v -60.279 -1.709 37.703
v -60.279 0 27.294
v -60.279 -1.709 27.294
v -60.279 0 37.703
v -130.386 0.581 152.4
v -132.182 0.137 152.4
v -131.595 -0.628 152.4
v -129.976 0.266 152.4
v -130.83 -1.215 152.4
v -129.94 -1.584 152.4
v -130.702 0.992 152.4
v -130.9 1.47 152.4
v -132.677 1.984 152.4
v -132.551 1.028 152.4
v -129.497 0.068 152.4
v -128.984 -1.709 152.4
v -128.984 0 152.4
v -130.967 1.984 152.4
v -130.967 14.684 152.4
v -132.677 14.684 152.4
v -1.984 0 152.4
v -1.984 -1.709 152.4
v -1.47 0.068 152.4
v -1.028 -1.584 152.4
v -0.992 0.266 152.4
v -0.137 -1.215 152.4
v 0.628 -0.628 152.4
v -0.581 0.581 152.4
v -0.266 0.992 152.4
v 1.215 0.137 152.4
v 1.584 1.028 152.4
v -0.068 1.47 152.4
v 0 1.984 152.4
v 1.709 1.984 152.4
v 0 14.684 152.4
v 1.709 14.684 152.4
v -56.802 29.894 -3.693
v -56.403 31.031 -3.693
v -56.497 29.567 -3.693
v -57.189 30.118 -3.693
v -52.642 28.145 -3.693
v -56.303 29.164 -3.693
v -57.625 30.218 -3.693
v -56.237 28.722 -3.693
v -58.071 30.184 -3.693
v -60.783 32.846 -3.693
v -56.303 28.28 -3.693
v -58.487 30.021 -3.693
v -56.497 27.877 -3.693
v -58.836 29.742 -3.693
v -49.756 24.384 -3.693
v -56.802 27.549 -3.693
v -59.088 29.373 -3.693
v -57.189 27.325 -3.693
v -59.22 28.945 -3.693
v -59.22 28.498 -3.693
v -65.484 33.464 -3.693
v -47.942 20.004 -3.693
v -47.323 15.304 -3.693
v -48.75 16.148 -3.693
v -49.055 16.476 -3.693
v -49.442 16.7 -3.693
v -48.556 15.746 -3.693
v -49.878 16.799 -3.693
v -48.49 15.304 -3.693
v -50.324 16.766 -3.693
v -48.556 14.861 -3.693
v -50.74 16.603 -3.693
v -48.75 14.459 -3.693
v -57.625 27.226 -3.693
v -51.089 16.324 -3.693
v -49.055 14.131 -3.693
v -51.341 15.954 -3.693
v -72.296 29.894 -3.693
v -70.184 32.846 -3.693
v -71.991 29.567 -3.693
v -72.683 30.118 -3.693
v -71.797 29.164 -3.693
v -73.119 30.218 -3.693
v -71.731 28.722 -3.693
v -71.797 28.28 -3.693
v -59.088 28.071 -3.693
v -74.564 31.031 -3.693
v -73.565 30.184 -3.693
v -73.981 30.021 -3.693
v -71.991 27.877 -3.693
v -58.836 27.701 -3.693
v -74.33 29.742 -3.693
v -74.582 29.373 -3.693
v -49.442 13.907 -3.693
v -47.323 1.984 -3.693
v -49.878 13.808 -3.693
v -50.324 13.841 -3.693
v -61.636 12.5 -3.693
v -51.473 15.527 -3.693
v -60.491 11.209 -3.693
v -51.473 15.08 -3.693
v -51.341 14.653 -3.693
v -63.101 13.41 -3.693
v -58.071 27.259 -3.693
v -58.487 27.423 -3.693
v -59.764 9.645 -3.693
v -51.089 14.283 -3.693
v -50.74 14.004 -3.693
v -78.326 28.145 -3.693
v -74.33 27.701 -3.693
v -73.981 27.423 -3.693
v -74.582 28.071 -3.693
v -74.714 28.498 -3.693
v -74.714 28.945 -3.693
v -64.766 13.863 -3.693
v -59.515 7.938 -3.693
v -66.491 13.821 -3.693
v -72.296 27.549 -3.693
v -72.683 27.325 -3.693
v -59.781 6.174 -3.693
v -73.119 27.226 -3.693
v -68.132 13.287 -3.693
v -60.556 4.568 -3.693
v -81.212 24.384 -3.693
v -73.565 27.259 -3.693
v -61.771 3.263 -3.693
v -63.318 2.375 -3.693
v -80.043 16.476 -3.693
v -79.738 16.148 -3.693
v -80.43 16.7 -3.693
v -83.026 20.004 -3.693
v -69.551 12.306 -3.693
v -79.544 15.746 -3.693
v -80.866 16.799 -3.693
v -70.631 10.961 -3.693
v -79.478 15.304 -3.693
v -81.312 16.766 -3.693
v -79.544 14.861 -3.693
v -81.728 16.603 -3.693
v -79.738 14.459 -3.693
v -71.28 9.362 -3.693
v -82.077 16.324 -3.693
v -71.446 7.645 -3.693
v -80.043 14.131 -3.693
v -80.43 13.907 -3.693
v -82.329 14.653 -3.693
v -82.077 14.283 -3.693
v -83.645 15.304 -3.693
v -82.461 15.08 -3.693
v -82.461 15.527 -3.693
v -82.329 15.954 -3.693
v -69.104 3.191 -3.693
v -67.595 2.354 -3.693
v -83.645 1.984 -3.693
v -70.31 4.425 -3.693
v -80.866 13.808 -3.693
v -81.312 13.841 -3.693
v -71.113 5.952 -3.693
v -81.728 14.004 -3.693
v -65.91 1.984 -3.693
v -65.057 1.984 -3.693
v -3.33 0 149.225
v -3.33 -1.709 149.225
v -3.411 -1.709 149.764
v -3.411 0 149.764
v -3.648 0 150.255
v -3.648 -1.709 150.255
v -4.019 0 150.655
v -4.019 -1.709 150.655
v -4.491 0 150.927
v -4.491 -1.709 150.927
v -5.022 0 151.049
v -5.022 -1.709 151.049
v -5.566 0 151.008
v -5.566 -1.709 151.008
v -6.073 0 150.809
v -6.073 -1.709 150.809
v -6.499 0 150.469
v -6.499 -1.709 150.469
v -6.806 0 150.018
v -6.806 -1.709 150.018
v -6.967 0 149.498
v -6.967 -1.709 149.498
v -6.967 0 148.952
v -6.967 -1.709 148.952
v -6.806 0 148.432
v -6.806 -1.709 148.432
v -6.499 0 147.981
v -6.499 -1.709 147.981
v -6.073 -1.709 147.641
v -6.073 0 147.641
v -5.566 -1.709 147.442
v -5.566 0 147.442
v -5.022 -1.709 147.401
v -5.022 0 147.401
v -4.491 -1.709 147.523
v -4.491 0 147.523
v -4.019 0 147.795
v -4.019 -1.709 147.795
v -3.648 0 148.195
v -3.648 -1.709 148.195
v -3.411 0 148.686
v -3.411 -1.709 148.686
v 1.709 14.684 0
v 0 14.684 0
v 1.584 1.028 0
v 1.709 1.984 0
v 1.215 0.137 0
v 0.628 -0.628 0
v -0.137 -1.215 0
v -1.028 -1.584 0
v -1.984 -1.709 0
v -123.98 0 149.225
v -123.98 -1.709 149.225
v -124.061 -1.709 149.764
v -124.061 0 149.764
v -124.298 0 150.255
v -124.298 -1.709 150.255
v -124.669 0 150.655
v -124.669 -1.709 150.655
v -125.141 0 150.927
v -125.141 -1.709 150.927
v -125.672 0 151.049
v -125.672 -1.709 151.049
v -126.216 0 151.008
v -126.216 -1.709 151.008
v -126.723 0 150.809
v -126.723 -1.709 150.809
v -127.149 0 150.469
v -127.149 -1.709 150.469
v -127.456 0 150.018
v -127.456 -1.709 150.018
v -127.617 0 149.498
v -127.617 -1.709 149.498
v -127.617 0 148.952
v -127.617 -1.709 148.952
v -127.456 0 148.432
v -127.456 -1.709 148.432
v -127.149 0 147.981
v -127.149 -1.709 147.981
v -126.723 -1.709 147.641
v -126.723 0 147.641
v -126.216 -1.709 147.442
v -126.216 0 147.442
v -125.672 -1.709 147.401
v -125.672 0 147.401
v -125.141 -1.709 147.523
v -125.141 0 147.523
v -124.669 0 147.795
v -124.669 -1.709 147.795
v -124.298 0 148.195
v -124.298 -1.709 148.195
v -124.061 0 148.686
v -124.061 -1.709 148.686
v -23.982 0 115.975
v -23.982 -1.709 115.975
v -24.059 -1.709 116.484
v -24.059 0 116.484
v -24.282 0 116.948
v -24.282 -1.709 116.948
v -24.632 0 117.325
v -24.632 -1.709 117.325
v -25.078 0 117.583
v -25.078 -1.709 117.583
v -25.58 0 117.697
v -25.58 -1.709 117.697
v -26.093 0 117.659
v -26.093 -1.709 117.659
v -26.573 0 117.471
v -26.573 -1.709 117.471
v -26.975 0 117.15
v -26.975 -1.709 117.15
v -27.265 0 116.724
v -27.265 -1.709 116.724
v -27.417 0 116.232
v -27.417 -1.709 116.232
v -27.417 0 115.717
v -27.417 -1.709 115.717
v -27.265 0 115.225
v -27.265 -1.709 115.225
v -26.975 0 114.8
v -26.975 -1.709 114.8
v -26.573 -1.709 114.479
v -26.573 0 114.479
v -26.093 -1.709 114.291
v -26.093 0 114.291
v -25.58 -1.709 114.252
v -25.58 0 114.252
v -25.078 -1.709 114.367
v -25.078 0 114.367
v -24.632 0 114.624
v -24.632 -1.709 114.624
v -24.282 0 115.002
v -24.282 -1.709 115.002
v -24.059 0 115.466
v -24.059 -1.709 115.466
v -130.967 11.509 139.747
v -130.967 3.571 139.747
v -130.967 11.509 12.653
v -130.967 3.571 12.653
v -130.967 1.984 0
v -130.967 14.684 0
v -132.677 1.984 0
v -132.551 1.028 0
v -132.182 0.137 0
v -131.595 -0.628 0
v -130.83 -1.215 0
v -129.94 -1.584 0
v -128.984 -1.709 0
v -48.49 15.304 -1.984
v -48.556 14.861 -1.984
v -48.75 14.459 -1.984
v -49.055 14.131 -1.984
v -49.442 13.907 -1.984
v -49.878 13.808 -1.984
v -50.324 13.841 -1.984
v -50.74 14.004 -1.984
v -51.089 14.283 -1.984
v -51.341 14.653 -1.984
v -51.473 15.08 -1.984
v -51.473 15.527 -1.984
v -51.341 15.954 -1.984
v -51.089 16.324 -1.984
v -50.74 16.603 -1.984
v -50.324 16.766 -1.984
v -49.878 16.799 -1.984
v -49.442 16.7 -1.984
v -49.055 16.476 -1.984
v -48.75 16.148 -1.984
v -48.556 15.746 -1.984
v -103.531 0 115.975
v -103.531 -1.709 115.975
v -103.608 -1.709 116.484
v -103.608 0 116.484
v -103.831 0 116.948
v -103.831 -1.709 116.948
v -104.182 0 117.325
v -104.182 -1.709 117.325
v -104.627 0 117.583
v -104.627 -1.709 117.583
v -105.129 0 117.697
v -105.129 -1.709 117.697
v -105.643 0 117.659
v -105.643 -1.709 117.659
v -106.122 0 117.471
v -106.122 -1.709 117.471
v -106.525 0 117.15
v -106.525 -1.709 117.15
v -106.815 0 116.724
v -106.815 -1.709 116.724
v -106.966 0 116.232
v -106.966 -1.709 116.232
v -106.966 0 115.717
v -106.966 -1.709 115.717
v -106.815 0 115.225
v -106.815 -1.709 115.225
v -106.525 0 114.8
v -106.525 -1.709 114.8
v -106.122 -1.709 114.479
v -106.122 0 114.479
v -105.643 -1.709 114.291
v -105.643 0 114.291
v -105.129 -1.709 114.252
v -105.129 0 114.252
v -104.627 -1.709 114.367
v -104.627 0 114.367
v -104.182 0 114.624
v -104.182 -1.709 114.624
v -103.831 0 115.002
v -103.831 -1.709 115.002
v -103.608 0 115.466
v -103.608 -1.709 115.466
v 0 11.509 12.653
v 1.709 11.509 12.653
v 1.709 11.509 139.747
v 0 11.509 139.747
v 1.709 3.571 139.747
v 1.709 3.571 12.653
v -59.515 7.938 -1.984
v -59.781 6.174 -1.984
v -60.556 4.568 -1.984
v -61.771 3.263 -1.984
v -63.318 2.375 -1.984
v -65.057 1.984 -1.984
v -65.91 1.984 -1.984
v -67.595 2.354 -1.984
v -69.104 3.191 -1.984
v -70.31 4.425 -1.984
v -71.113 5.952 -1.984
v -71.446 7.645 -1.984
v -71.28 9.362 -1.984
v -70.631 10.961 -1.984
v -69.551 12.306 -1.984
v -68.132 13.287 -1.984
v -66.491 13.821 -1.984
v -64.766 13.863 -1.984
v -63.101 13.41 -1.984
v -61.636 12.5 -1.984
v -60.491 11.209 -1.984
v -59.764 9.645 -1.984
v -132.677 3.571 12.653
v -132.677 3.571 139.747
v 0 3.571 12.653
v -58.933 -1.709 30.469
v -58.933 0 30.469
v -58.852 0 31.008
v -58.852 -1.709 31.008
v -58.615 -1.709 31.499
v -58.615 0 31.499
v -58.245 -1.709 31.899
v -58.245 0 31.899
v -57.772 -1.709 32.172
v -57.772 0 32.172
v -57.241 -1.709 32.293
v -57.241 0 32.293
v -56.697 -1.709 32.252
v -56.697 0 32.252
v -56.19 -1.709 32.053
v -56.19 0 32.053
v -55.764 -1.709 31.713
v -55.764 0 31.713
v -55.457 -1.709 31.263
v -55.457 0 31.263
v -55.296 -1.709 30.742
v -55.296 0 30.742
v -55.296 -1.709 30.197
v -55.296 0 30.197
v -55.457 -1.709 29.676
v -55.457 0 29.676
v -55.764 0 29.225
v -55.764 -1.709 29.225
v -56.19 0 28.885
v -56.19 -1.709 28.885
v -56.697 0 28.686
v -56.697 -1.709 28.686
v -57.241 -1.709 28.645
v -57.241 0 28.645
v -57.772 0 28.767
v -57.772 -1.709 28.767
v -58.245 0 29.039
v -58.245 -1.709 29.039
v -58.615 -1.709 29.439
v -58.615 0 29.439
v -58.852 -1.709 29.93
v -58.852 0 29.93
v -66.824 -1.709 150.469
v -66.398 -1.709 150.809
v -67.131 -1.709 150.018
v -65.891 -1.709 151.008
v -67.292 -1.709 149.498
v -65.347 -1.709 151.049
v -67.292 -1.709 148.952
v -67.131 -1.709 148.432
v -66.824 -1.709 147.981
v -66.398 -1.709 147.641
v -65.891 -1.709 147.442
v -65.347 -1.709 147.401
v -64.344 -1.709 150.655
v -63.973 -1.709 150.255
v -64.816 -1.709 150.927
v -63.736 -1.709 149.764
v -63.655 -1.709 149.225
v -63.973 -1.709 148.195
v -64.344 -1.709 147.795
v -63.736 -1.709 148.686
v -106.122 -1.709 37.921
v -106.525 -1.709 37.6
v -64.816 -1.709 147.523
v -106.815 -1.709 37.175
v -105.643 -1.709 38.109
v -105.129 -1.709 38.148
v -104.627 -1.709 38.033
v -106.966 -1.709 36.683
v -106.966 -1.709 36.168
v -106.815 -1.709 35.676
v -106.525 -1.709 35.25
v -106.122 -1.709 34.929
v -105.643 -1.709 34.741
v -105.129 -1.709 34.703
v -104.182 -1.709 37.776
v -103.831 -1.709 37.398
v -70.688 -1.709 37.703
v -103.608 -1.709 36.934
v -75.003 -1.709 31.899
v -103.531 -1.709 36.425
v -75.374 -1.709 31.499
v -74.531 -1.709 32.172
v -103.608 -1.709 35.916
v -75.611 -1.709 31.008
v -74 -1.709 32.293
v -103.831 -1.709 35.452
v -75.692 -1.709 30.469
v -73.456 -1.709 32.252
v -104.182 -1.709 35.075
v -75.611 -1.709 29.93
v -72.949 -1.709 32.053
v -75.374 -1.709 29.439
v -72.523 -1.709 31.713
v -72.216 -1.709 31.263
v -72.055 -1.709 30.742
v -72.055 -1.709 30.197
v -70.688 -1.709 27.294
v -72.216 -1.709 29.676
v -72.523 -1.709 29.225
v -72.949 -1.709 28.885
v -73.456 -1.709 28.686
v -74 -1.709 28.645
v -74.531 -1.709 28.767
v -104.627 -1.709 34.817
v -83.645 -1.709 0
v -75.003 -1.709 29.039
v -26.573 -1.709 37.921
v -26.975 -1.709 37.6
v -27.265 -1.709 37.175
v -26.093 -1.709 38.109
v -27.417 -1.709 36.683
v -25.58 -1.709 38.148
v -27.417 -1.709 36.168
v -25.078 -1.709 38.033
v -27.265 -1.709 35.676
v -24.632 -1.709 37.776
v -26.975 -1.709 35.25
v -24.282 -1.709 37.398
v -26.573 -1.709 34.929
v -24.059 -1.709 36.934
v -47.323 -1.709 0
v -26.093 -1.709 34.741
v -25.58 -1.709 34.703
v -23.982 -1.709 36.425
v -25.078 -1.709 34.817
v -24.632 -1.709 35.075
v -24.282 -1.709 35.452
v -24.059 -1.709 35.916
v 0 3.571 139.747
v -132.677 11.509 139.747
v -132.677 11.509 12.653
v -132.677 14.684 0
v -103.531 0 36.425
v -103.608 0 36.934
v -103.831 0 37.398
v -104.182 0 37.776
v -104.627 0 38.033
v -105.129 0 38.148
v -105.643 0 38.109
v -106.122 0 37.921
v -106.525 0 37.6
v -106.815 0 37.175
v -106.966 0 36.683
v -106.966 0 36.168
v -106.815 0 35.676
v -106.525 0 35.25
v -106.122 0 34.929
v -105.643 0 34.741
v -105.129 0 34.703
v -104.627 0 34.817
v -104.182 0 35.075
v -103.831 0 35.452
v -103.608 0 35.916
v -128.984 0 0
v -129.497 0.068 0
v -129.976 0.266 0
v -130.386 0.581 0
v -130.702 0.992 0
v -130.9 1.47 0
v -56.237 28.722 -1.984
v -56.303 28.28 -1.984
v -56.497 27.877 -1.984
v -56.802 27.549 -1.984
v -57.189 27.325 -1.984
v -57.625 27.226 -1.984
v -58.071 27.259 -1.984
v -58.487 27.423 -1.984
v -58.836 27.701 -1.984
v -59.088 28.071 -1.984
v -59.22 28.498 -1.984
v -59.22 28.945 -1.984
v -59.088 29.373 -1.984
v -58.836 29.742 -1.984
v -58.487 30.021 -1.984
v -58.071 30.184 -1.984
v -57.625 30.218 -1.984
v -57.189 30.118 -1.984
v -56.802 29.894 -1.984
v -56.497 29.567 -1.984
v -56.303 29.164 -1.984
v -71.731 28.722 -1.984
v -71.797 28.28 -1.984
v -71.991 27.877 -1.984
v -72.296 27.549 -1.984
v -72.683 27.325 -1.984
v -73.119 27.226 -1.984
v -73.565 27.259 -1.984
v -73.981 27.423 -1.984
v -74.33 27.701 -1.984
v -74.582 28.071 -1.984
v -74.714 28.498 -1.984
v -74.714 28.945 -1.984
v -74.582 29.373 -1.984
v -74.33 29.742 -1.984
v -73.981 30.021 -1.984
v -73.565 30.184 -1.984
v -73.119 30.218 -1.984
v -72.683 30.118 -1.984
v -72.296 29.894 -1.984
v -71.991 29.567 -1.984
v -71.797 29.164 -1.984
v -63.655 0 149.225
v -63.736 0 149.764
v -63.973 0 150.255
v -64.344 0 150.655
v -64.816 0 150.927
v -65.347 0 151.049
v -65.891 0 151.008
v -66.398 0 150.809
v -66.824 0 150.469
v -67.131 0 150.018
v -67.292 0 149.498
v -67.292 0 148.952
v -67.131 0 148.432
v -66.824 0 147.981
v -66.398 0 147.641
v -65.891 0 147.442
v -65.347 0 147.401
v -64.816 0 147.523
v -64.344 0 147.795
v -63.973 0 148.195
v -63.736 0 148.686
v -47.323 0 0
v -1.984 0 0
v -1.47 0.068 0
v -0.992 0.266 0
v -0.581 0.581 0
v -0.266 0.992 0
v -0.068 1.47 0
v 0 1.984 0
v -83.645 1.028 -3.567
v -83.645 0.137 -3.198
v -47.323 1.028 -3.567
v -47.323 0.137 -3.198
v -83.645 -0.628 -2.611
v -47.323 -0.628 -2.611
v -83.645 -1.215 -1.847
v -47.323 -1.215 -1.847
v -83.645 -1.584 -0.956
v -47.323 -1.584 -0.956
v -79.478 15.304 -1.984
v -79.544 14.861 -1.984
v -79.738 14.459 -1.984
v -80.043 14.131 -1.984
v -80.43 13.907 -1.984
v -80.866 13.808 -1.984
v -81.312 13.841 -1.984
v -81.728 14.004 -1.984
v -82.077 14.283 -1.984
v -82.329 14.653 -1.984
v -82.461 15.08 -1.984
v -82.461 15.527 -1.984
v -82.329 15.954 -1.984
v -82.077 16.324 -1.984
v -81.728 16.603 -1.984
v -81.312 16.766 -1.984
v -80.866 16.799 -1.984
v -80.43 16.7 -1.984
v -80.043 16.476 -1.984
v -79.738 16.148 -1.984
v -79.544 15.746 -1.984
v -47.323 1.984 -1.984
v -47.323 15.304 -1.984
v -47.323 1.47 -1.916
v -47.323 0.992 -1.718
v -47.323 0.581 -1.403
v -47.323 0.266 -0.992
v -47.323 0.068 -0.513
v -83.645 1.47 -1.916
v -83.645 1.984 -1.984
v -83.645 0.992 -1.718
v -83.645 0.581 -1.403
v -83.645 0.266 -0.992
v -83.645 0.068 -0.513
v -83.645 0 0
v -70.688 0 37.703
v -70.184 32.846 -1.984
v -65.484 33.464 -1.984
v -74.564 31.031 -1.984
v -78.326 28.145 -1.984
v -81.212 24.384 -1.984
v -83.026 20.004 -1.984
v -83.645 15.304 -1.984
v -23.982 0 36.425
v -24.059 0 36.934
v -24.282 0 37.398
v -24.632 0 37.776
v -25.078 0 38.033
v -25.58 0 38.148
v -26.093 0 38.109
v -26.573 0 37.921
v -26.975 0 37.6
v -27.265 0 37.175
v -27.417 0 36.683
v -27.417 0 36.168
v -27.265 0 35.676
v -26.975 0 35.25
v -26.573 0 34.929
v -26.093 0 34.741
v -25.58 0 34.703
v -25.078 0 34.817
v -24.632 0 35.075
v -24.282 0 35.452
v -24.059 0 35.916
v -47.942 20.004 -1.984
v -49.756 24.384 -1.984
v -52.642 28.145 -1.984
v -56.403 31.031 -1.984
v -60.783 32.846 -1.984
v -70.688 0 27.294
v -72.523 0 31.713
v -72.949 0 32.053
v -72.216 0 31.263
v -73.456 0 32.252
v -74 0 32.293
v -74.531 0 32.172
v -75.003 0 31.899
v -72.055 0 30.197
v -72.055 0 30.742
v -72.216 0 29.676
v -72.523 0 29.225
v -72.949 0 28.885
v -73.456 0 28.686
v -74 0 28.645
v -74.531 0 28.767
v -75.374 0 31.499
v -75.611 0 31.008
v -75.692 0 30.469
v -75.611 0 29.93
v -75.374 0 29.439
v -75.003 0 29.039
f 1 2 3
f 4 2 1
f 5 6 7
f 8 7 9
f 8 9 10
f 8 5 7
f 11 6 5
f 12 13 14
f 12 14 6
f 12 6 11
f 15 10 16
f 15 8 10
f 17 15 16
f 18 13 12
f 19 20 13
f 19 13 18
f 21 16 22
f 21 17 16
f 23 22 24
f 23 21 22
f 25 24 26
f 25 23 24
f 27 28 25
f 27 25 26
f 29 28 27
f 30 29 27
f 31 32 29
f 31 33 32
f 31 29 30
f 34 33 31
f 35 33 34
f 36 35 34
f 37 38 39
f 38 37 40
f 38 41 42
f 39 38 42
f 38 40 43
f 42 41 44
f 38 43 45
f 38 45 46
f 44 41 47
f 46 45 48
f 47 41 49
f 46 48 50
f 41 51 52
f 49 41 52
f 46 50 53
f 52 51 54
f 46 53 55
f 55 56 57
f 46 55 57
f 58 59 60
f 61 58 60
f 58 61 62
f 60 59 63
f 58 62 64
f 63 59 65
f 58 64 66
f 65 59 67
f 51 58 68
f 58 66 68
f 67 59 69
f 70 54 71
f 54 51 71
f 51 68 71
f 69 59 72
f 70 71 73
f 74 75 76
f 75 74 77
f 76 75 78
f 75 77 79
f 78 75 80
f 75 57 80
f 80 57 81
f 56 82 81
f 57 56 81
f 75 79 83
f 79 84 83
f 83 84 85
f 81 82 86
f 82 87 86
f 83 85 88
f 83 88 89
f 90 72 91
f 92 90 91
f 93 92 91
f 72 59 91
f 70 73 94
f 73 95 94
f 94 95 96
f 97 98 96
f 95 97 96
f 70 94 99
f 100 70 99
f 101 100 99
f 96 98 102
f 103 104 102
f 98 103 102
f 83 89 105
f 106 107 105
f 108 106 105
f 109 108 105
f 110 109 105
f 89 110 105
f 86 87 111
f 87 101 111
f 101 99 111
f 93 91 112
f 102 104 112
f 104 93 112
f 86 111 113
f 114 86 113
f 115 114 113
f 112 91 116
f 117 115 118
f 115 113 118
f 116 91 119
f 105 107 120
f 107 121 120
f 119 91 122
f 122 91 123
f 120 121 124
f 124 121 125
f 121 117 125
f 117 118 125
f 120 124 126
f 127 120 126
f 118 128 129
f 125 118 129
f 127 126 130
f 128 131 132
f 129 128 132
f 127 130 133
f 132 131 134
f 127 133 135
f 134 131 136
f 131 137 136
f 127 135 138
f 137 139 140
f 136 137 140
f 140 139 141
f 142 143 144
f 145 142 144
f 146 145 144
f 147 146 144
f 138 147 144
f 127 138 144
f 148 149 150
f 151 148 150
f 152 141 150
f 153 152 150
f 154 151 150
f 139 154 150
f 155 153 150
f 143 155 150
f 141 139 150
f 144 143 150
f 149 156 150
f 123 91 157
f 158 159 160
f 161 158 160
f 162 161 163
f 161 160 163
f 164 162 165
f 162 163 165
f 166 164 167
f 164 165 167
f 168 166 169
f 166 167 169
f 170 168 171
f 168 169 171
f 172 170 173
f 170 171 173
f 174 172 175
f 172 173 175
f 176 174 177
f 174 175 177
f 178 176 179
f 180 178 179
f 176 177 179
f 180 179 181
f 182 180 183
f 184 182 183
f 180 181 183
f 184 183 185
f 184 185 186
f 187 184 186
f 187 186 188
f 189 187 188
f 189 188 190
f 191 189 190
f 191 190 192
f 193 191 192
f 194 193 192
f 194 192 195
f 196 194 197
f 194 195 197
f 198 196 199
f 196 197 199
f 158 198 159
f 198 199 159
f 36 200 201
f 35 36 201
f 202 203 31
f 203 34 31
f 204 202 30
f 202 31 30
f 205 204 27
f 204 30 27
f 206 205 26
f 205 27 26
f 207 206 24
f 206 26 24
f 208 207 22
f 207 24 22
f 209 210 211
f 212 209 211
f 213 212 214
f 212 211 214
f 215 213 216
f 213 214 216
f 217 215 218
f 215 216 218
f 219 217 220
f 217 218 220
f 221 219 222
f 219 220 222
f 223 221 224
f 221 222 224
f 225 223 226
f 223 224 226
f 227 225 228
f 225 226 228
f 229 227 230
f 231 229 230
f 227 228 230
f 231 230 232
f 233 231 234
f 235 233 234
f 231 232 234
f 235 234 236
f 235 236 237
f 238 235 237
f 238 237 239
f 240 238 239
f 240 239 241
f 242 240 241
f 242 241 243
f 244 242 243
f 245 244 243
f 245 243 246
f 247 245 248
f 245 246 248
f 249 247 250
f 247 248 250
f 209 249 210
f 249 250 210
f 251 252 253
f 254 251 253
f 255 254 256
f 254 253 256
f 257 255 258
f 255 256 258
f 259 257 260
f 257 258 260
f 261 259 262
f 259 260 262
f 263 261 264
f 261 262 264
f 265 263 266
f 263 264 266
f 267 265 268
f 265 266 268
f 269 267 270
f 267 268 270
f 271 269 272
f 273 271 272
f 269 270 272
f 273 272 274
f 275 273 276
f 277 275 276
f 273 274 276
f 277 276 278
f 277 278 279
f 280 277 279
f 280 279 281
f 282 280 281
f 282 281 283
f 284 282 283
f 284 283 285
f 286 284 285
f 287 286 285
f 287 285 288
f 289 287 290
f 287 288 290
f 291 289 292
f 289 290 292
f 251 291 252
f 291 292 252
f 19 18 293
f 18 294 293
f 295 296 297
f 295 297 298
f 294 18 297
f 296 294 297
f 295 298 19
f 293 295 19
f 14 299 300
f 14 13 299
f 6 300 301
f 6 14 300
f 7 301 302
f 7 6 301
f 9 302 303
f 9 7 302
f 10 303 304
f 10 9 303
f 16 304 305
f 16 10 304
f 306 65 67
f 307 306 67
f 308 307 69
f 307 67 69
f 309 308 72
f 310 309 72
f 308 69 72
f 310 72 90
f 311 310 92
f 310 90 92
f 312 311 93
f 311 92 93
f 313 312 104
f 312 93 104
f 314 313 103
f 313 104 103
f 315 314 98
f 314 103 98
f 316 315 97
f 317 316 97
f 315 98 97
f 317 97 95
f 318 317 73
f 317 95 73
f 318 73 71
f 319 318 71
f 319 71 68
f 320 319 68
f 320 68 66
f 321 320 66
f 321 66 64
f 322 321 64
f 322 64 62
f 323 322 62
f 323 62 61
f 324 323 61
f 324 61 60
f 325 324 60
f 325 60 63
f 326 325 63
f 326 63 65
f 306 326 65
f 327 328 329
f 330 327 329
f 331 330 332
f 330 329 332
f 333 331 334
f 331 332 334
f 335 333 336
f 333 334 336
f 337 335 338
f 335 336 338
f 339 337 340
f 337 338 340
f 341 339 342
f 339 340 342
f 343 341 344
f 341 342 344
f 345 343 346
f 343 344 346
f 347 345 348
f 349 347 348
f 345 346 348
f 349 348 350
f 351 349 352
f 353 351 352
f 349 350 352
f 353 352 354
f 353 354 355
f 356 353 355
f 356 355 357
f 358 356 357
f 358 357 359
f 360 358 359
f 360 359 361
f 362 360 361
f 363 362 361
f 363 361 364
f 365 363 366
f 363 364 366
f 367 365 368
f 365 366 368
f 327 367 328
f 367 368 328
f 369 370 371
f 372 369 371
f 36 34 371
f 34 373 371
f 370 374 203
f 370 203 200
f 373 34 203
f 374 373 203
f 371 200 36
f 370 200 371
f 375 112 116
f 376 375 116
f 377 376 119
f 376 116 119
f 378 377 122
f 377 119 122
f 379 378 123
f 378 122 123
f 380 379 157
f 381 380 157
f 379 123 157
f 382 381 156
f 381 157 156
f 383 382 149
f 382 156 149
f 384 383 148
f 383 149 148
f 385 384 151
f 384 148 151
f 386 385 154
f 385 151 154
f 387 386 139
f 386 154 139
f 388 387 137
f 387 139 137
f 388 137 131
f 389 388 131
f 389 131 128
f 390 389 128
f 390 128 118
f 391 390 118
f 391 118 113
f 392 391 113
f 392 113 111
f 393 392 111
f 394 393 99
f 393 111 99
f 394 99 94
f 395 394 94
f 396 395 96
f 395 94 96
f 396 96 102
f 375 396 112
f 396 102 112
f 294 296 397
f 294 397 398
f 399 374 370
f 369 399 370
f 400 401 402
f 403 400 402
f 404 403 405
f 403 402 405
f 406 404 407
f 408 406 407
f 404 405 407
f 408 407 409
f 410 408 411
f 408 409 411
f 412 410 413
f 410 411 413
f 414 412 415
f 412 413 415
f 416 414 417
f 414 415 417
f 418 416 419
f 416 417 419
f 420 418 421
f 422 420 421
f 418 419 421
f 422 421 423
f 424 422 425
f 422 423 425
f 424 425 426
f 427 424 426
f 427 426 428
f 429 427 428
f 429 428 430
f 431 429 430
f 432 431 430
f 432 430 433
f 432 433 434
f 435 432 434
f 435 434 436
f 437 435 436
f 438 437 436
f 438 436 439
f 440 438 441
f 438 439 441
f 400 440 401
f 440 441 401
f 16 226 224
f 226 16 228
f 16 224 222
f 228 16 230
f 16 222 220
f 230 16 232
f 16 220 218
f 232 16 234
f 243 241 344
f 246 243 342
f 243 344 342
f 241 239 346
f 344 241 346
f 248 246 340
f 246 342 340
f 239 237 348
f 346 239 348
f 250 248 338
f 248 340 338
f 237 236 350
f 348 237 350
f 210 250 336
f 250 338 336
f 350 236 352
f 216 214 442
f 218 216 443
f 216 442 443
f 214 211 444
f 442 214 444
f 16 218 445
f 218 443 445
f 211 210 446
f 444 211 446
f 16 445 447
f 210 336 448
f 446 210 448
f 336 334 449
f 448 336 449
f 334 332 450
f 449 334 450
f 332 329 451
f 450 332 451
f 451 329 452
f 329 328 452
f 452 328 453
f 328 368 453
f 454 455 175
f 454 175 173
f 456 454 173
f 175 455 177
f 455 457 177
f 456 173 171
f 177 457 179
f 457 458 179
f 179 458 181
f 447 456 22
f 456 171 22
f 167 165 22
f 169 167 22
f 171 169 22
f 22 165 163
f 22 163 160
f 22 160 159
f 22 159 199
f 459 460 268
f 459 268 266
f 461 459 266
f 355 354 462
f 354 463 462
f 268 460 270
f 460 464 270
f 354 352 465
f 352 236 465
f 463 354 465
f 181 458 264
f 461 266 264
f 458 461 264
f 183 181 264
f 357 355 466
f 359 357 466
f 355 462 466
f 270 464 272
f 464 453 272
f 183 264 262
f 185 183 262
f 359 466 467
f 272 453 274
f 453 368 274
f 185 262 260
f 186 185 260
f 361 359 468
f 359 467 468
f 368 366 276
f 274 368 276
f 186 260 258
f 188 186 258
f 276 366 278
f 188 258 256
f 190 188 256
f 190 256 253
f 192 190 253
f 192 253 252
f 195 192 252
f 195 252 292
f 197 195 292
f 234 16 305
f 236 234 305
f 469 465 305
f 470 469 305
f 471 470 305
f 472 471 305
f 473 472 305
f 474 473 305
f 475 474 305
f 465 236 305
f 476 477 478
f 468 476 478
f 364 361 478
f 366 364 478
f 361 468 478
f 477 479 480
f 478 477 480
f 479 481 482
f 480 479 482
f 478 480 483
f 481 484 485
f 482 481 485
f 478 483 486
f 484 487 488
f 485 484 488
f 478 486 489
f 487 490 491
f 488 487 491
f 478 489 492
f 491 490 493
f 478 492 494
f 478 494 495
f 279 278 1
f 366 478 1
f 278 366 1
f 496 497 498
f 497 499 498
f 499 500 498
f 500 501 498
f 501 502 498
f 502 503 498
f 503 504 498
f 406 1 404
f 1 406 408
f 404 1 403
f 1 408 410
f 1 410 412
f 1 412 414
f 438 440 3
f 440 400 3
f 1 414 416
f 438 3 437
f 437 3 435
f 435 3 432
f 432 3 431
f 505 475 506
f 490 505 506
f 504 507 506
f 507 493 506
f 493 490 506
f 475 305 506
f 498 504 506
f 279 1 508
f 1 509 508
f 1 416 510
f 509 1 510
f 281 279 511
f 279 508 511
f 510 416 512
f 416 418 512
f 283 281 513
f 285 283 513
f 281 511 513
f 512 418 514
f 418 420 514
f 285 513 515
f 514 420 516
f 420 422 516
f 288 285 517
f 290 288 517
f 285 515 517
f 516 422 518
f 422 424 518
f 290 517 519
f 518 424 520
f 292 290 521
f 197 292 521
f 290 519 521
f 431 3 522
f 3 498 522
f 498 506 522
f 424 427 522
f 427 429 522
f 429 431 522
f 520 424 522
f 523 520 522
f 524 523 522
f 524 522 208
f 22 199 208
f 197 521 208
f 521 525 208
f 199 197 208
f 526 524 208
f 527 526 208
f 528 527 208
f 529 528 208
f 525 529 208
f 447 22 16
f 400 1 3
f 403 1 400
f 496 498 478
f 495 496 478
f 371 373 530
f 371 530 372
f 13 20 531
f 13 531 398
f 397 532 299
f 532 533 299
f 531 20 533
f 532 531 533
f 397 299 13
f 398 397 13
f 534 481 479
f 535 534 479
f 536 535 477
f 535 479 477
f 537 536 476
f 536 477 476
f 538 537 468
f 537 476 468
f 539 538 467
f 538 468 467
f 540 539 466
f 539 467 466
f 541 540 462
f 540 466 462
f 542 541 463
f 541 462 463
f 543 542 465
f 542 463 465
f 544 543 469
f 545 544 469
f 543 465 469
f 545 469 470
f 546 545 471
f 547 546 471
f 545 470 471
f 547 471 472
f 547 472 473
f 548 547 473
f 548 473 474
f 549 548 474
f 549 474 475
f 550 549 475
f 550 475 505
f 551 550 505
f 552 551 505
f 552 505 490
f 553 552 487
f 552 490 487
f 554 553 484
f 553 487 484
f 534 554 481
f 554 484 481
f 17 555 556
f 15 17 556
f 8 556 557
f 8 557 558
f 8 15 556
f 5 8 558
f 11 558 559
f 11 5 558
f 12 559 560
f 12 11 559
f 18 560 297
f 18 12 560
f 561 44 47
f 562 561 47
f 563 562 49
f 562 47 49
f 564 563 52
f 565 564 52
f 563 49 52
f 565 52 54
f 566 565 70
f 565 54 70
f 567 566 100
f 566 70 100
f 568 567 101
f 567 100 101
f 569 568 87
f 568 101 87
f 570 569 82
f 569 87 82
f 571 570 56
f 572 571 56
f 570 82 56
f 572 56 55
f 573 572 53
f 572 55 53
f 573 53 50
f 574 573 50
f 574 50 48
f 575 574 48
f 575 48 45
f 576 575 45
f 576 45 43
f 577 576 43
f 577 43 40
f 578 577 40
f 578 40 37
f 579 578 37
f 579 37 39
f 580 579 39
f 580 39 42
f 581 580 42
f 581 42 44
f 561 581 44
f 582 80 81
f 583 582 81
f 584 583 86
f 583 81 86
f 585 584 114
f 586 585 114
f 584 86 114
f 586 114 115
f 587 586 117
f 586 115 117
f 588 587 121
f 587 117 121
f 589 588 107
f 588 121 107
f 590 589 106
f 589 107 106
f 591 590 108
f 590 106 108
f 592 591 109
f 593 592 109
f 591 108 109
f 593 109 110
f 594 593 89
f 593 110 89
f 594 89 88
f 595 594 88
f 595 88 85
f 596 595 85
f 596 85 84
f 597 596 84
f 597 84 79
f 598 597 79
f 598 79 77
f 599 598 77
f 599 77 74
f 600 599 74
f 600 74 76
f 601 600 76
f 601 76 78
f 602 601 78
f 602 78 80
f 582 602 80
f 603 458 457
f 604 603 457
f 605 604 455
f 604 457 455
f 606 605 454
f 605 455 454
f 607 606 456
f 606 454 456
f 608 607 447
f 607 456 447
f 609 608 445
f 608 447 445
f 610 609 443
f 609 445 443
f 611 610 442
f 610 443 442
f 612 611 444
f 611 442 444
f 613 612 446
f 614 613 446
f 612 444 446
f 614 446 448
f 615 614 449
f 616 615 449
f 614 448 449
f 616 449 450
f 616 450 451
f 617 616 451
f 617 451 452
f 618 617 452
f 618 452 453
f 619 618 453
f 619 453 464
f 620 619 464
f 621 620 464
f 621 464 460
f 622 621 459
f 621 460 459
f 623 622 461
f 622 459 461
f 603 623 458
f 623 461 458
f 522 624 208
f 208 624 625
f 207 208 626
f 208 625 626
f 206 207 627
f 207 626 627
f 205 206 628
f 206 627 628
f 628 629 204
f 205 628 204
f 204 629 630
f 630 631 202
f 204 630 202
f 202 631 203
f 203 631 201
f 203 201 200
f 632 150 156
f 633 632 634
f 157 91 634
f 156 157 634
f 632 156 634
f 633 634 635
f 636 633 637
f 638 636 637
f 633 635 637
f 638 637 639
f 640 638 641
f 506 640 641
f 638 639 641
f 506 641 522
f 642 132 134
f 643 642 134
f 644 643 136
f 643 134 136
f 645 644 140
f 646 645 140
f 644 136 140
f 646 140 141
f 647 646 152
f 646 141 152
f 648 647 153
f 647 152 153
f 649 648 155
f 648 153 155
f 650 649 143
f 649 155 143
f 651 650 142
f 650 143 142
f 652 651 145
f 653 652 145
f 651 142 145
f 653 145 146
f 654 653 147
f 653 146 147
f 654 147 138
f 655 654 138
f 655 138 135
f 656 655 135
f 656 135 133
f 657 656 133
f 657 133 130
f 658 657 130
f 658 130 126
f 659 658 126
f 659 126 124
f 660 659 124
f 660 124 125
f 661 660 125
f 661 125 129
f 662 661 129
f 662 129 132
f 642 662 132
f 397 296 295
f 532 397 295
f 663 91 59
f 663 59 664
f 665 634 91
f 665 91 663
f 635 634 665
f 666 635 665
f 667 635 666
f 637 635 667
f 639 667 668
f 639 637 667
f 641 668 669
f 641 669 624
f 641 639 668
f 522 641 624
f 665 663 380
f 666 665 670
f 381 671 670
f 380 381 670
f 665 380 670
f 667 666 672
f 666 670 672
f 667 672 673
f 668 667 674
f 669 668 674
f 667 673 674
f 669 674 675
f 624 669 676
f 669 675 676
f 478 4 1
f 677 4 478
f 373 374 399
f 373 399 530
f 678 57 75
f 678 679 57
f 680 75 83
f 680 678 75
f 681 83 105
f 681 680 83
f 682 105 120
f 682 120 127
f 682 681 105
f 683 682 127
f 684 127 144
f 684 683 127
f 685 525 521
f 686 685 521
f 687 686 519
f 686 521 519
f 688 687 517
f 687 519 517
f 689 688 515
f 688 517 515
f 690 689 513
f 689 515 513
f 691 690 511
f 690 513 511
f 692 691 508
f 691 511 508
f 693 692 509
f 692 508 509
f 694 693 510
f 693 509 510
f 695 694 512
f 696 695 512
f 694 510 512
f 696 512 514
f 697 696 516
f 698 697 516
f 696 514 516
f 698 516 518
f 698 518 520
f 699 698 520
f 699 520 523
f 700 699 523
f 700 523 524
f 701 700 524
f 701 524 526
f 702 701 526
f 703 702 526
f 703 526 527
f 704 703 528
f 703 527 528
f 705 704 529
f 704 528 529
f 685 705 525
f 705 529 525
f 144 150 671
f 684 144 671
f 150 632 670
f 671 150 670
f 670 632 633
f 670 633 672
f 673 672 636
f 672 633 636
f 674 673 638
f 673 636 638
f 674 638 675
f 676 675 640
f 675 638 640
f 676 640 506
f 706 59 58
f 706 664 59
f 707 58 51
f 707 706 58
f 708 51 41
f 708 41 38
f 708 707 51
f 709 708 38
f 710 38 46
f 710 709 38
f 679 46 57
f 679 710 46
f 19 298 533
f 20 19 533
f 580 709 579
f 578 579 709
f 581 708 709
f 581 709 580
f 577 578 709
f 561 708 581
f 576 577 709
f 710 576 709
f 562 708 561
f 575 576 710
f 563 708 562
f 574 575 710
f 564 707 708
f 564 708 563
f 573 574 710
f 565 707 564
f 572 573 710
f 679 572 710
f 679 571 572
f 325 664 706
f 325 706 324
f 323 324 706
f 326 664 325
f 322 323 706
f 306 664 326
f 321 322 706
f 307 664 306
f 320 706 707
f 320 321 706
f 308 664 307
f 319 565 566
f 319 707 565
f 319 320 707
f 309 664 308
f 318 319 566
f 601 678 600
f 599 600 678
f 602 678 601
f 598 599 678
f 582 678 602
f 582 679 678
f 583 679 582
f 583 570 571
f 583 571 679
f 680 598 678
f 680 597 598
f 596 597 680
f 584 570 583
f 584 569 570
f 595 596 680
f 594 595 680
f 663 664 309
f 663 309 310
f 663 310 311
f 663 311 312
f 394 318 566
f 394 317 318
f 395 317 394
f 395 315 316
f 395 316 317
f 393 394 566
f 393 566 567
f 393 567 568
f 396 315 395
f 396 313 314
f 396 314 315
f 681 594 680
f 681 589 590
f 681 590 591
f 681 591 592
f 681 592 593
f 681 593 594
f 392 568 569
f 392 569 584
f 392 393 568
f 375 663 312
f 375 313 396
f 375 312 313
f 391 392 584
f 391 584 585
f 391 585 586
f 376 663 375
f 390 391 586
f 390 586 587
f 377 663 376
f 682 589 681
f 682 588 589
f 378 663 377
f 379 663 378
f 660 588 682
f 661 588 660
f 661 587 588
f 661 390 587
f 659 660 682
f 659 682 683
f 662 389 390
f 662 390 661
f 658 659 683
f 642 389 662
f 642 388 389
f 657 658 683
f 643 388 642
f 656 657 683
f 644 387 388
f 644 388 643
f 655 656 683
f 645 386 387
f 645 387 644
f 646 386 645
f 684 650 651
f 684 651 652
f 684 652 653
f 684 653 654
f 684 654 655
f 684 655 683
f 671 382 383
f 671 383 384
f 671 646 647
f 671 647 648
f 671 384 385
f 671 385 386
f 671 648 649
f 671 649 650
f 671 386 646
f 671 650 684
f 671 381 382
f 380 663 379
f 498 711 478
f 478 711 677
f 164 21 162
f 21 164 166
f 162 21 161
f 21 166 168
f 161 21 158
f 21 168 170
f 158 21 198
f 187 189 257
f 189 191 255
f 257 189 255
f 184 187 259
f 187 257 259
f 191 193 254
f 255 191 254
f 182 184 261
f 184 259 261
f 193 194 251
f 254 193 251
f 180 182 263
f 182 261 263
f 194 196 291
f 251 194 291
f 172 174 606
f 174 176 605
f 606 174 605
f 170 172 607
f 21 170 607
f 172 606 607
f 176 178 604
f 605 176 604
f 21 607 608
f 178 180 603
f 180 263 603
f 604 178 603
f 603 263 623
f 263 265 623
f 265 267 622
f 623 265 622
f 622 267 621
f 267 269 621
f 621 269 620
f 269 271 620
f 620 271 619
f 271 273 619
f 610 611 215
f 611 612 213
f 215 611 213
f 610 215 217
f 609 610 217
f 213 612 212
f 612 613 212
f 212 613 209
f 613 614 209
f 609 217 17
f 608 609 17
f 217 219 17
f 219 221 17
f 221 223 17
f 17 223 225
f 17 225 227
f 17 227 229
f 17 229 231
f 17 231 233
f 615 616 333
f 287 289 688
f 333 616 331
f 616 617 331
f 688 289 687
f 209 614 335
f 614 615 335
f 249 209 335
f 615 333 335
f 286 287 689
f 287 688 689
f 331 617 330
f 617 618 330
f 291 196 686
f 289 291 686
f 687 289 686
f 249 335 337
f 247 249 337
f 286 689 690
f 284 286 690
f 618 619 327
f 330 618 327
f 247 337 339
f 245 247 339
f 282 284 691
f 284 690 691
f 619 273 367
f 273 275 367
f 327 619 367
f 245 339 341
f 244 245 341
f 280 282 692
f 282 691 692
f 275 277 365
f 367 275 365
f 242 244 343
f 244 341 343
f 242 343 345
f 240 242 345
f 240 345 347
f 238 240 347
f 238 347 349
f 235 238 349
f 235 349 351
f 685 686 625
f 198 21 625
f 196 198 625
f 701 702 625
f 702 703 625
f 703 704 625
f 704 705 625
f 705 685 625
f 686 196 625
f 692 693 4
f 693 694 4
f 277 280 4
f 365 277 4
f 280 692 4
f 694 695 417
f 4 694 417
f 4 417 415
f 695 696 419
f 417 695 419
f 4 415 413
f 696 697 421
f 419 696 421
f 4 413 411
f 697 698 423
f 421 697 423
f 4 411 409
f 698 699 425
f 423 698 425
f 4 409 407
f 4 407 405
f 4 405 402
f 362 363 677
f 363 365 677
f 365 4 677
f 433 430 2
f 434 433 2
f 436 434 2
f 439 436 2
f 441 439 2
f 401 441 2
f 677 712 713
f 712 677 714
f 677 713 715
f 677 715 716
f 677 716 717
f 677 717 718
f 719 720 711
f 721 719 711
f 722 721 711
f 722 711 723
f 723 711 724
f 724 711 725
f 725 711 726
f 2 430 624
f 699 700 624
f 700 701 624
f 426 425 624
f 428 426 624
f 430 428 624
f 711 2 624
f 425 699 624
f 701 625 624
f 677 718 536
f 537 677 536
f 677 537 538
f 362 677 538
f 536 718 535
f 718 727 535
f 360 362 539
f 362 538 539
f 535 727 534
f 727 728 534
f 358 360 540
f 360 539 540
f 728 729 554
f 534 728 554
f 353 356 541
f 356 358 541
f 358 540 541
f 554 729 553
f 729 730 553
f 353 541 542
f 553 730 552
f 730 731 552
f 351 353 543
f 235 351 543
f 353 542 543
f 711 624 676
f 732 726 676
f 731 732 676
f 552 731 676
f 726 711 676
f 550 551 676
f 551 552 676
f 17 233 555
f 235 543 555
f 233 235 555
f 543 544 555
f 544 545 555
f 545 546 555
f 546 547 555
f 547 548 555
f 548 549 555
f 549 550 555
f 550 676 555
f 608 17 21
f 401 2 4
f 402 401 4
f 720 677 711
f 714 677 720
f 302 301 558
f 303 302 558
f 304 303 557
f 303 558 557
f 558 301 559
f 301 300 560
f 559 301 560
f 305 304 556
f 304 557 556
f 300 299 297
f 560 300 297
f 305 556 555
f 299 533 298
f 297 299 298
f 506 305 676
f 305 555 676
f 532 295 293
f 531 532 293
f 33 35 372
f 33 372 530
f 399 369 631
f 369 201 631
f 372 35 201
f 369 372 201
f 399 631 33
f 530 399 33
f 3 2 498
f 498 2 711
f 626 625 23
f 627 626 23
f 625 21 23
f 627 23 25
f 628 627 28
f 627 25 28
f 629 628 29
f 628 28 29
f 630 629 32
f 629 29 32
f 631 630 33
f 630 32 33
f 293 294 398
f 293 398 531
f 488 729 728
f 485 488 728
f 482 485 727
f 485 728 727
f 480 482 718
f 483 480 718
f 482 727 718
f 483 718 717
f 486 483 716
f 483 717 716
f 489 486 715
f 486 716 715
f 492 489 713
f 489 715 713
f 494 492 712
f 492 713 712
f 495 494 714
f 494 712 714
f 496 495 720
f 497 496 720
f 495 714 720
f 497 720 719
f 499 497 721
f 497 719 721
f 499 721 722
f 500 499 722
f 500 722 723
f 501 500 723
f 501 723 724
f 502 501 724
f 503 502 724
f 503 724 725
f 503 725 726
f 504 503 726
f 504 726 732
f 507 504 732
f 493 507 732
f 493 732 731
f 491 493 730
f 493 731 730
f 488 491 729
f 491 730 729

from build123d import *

# Parameters (mm, degrees)
F1_DEPTH  = 152.4
F2_W      = 7.9375
F2_H      = 127.0931567346
F3_DEPTH  = 134.38632
F4_W      = 36.322
F4_H      = 1.70942
F5_DEPTH  = 3.69316
F6_W      = 36.322
F6_H      = 1.70942
F7_DEPTH  = 33.4645
F8_R      = 3.69316
F9_R      = 1.98374
F10_R     = 5.969
F10_R_2   = 1.5
F11_DEPTH = 3.69316
F12_R     = 18.16099
F13_R     = 1.8288
F14_DEPTH = 1.70942
F15_R     = 1.7272
F16_DEPTH = 1.70942
F17_W     = 10.40892
F17_H     = 10.40892
F17_R     = 1.8288
F18_DEPTH = 1.70942


# Not quite as in the source:
# - a fillet or chamfer is up to 0.001 mm smaller than in the source, because OpenCascade refuses the exact size


with BuildPart() as f1:
    # F0 (on Top) → F1 (new body)
    with BuildSketch(Plane.XY):
        Polygon((0, 14.68374), (0, 0), (-130.96748, 0), (-130.96748, 14.68374), (-132.6769, 14.68374), (-132.6769, -1.70942), (1.70942, -1.70942), (1.70942, 14.68374), align=None)
    extrude(amount=F1_DEPTH)

    # F2 (on face) → F3 (cut, through all)
    with BuildSketch(Plane.YZ.offset(1.70942)):
        with Locations((7.53999, 76.2)):
            Rectangle(F2_W, F2_H)
    extrude(amount=-F3_DEPTH, mode=Mode.SUBTRACT)

    # F4 (on face) → F5 (join)
    with BuildSketch(Plane(origin=(0, 0, 0), x_dir=(1, 0, 0), z_dir=(0, 0, -1))):
        with Locations((-65.48374, 0.85471)):
            Rectangle(F4_W, F4_H)
    extrude(amount=F5_DEPTH)

    # F6 (on face) → F7 (join)
    with BuildSketch(Plane(origin=(0, 0, 0), x_dir=(-1, 0, 0), z_dir=(0, 1, 0))):
        with Locations((65.48374, -2.83845)):
            Rectangle(F6_W, F6_H)
    extrude(amount=F7_DEPTH)

    # F8
    f8_edges = [f1.edges().sort_by_distance(p)[0] for p in [
        (1.70942, -1.70942, 76.2),
        (-132.6769, -1.70942, 76.2),
        (-65.48374, -1.70942, -3.69316),
    ]]
    fillet(f8_edges, radius=F8_R)

    # F9
    f9_edges = [f1.edges().sort_by_distance(p)[0] for p in [
        (0, 0, 76.2),
        (-130.96748, 0, 76.2),
        (-65.48374, 0, -1.98374),
    ]]
    fillet(f9_edges, radius=F9_R)

    # F10 (on face) → F11 (cut, through all)
    with BuildSketch(Plane(origin=(0, 0, -3.69316), x_dir=(1, 0, 0), z_dir=(0, 0, -1))):
        with Locations((-65.48374, -7.9375)):
            Circle(F10_R)
        with Locations((-49.9897398917, -15.3035)):
            Circle(F10_R_2)
        with Locations((-80.9777401083, -15.3035)):
            Circle(F10_R_2)
        with Locations((-73.2307400541, -28.7216977)):
            Circle(F10_R_2)
        with Locations((-57.7367399459, -28.7216977)):
            Circle(F10_R_2)
    extrude(amount=-F11_DEPTH, mode=Mode.SUBTRACT)

    # F12 (radius 18.161 in the source; OpenCascade refuses exactly that, so slightly less here)
    f12_edges = [f1.edges().sort_by_distance(p)[0] for p in [
        (-47.32274, 33.4645, -2.83845),
        (-83.64474, 33.4645, -2.83845),
    ]]
    fillet(f12_edges, radius=F12_R)

    # F13 (on face) → F14 (cut, through all)
    with BuildSketch(Plane.XZ.offset(1.70942)):
        with Locations((-65.48374, 149.225)):
            Circle(F13_R)
        with Locations((-5.15874, 149.225)):
            Circle(F13_R)
        with Locations((-125.80874, 149.225)):
            Circle(F13_R)
    extrude(amount=-F14_DEPTH, mode=Mode.SUBTRACT)

    # F15 (on face) → F16 (cut, through all)
    with BuildSketch(Plane.XZ.offset(1.70942)):
        with Locations((-105.2585017, 115.9747617)):
            Circle(F15_R)
        with Locations((-25.7089783, 115.9747617)):
            Circle(F15_R)
        with Locations((-25.7089783, 36.4252383)):
            Circle(F15_R)
        with Locations((-105.2585017, 36.4252383)):
            Circle(F15_R)
    extrude(amount=-F16_DEPTH, mode=Mode.SUBTRACT)

    # F17 (on face) → F18 (cut, through all)
    with BuildSketch(Plane(origin=(0, 0, 0), x_dir=(-1, 0, 0), z_dir=(0, 1, 0))):
        with Locations((65.48374, 32.4986058015)):
            Rectangle(F17_W, F17_H)
        with Locations((73.8632, 30.4691458015)):
            Circle(F17_R)
        with Locations((57.10428, 30.4691458015)):
            Circle(F17_R)
    extrude(amount=-F18_DEPTH, mode=Mode.SUBTRACT)


solid = f1.part
